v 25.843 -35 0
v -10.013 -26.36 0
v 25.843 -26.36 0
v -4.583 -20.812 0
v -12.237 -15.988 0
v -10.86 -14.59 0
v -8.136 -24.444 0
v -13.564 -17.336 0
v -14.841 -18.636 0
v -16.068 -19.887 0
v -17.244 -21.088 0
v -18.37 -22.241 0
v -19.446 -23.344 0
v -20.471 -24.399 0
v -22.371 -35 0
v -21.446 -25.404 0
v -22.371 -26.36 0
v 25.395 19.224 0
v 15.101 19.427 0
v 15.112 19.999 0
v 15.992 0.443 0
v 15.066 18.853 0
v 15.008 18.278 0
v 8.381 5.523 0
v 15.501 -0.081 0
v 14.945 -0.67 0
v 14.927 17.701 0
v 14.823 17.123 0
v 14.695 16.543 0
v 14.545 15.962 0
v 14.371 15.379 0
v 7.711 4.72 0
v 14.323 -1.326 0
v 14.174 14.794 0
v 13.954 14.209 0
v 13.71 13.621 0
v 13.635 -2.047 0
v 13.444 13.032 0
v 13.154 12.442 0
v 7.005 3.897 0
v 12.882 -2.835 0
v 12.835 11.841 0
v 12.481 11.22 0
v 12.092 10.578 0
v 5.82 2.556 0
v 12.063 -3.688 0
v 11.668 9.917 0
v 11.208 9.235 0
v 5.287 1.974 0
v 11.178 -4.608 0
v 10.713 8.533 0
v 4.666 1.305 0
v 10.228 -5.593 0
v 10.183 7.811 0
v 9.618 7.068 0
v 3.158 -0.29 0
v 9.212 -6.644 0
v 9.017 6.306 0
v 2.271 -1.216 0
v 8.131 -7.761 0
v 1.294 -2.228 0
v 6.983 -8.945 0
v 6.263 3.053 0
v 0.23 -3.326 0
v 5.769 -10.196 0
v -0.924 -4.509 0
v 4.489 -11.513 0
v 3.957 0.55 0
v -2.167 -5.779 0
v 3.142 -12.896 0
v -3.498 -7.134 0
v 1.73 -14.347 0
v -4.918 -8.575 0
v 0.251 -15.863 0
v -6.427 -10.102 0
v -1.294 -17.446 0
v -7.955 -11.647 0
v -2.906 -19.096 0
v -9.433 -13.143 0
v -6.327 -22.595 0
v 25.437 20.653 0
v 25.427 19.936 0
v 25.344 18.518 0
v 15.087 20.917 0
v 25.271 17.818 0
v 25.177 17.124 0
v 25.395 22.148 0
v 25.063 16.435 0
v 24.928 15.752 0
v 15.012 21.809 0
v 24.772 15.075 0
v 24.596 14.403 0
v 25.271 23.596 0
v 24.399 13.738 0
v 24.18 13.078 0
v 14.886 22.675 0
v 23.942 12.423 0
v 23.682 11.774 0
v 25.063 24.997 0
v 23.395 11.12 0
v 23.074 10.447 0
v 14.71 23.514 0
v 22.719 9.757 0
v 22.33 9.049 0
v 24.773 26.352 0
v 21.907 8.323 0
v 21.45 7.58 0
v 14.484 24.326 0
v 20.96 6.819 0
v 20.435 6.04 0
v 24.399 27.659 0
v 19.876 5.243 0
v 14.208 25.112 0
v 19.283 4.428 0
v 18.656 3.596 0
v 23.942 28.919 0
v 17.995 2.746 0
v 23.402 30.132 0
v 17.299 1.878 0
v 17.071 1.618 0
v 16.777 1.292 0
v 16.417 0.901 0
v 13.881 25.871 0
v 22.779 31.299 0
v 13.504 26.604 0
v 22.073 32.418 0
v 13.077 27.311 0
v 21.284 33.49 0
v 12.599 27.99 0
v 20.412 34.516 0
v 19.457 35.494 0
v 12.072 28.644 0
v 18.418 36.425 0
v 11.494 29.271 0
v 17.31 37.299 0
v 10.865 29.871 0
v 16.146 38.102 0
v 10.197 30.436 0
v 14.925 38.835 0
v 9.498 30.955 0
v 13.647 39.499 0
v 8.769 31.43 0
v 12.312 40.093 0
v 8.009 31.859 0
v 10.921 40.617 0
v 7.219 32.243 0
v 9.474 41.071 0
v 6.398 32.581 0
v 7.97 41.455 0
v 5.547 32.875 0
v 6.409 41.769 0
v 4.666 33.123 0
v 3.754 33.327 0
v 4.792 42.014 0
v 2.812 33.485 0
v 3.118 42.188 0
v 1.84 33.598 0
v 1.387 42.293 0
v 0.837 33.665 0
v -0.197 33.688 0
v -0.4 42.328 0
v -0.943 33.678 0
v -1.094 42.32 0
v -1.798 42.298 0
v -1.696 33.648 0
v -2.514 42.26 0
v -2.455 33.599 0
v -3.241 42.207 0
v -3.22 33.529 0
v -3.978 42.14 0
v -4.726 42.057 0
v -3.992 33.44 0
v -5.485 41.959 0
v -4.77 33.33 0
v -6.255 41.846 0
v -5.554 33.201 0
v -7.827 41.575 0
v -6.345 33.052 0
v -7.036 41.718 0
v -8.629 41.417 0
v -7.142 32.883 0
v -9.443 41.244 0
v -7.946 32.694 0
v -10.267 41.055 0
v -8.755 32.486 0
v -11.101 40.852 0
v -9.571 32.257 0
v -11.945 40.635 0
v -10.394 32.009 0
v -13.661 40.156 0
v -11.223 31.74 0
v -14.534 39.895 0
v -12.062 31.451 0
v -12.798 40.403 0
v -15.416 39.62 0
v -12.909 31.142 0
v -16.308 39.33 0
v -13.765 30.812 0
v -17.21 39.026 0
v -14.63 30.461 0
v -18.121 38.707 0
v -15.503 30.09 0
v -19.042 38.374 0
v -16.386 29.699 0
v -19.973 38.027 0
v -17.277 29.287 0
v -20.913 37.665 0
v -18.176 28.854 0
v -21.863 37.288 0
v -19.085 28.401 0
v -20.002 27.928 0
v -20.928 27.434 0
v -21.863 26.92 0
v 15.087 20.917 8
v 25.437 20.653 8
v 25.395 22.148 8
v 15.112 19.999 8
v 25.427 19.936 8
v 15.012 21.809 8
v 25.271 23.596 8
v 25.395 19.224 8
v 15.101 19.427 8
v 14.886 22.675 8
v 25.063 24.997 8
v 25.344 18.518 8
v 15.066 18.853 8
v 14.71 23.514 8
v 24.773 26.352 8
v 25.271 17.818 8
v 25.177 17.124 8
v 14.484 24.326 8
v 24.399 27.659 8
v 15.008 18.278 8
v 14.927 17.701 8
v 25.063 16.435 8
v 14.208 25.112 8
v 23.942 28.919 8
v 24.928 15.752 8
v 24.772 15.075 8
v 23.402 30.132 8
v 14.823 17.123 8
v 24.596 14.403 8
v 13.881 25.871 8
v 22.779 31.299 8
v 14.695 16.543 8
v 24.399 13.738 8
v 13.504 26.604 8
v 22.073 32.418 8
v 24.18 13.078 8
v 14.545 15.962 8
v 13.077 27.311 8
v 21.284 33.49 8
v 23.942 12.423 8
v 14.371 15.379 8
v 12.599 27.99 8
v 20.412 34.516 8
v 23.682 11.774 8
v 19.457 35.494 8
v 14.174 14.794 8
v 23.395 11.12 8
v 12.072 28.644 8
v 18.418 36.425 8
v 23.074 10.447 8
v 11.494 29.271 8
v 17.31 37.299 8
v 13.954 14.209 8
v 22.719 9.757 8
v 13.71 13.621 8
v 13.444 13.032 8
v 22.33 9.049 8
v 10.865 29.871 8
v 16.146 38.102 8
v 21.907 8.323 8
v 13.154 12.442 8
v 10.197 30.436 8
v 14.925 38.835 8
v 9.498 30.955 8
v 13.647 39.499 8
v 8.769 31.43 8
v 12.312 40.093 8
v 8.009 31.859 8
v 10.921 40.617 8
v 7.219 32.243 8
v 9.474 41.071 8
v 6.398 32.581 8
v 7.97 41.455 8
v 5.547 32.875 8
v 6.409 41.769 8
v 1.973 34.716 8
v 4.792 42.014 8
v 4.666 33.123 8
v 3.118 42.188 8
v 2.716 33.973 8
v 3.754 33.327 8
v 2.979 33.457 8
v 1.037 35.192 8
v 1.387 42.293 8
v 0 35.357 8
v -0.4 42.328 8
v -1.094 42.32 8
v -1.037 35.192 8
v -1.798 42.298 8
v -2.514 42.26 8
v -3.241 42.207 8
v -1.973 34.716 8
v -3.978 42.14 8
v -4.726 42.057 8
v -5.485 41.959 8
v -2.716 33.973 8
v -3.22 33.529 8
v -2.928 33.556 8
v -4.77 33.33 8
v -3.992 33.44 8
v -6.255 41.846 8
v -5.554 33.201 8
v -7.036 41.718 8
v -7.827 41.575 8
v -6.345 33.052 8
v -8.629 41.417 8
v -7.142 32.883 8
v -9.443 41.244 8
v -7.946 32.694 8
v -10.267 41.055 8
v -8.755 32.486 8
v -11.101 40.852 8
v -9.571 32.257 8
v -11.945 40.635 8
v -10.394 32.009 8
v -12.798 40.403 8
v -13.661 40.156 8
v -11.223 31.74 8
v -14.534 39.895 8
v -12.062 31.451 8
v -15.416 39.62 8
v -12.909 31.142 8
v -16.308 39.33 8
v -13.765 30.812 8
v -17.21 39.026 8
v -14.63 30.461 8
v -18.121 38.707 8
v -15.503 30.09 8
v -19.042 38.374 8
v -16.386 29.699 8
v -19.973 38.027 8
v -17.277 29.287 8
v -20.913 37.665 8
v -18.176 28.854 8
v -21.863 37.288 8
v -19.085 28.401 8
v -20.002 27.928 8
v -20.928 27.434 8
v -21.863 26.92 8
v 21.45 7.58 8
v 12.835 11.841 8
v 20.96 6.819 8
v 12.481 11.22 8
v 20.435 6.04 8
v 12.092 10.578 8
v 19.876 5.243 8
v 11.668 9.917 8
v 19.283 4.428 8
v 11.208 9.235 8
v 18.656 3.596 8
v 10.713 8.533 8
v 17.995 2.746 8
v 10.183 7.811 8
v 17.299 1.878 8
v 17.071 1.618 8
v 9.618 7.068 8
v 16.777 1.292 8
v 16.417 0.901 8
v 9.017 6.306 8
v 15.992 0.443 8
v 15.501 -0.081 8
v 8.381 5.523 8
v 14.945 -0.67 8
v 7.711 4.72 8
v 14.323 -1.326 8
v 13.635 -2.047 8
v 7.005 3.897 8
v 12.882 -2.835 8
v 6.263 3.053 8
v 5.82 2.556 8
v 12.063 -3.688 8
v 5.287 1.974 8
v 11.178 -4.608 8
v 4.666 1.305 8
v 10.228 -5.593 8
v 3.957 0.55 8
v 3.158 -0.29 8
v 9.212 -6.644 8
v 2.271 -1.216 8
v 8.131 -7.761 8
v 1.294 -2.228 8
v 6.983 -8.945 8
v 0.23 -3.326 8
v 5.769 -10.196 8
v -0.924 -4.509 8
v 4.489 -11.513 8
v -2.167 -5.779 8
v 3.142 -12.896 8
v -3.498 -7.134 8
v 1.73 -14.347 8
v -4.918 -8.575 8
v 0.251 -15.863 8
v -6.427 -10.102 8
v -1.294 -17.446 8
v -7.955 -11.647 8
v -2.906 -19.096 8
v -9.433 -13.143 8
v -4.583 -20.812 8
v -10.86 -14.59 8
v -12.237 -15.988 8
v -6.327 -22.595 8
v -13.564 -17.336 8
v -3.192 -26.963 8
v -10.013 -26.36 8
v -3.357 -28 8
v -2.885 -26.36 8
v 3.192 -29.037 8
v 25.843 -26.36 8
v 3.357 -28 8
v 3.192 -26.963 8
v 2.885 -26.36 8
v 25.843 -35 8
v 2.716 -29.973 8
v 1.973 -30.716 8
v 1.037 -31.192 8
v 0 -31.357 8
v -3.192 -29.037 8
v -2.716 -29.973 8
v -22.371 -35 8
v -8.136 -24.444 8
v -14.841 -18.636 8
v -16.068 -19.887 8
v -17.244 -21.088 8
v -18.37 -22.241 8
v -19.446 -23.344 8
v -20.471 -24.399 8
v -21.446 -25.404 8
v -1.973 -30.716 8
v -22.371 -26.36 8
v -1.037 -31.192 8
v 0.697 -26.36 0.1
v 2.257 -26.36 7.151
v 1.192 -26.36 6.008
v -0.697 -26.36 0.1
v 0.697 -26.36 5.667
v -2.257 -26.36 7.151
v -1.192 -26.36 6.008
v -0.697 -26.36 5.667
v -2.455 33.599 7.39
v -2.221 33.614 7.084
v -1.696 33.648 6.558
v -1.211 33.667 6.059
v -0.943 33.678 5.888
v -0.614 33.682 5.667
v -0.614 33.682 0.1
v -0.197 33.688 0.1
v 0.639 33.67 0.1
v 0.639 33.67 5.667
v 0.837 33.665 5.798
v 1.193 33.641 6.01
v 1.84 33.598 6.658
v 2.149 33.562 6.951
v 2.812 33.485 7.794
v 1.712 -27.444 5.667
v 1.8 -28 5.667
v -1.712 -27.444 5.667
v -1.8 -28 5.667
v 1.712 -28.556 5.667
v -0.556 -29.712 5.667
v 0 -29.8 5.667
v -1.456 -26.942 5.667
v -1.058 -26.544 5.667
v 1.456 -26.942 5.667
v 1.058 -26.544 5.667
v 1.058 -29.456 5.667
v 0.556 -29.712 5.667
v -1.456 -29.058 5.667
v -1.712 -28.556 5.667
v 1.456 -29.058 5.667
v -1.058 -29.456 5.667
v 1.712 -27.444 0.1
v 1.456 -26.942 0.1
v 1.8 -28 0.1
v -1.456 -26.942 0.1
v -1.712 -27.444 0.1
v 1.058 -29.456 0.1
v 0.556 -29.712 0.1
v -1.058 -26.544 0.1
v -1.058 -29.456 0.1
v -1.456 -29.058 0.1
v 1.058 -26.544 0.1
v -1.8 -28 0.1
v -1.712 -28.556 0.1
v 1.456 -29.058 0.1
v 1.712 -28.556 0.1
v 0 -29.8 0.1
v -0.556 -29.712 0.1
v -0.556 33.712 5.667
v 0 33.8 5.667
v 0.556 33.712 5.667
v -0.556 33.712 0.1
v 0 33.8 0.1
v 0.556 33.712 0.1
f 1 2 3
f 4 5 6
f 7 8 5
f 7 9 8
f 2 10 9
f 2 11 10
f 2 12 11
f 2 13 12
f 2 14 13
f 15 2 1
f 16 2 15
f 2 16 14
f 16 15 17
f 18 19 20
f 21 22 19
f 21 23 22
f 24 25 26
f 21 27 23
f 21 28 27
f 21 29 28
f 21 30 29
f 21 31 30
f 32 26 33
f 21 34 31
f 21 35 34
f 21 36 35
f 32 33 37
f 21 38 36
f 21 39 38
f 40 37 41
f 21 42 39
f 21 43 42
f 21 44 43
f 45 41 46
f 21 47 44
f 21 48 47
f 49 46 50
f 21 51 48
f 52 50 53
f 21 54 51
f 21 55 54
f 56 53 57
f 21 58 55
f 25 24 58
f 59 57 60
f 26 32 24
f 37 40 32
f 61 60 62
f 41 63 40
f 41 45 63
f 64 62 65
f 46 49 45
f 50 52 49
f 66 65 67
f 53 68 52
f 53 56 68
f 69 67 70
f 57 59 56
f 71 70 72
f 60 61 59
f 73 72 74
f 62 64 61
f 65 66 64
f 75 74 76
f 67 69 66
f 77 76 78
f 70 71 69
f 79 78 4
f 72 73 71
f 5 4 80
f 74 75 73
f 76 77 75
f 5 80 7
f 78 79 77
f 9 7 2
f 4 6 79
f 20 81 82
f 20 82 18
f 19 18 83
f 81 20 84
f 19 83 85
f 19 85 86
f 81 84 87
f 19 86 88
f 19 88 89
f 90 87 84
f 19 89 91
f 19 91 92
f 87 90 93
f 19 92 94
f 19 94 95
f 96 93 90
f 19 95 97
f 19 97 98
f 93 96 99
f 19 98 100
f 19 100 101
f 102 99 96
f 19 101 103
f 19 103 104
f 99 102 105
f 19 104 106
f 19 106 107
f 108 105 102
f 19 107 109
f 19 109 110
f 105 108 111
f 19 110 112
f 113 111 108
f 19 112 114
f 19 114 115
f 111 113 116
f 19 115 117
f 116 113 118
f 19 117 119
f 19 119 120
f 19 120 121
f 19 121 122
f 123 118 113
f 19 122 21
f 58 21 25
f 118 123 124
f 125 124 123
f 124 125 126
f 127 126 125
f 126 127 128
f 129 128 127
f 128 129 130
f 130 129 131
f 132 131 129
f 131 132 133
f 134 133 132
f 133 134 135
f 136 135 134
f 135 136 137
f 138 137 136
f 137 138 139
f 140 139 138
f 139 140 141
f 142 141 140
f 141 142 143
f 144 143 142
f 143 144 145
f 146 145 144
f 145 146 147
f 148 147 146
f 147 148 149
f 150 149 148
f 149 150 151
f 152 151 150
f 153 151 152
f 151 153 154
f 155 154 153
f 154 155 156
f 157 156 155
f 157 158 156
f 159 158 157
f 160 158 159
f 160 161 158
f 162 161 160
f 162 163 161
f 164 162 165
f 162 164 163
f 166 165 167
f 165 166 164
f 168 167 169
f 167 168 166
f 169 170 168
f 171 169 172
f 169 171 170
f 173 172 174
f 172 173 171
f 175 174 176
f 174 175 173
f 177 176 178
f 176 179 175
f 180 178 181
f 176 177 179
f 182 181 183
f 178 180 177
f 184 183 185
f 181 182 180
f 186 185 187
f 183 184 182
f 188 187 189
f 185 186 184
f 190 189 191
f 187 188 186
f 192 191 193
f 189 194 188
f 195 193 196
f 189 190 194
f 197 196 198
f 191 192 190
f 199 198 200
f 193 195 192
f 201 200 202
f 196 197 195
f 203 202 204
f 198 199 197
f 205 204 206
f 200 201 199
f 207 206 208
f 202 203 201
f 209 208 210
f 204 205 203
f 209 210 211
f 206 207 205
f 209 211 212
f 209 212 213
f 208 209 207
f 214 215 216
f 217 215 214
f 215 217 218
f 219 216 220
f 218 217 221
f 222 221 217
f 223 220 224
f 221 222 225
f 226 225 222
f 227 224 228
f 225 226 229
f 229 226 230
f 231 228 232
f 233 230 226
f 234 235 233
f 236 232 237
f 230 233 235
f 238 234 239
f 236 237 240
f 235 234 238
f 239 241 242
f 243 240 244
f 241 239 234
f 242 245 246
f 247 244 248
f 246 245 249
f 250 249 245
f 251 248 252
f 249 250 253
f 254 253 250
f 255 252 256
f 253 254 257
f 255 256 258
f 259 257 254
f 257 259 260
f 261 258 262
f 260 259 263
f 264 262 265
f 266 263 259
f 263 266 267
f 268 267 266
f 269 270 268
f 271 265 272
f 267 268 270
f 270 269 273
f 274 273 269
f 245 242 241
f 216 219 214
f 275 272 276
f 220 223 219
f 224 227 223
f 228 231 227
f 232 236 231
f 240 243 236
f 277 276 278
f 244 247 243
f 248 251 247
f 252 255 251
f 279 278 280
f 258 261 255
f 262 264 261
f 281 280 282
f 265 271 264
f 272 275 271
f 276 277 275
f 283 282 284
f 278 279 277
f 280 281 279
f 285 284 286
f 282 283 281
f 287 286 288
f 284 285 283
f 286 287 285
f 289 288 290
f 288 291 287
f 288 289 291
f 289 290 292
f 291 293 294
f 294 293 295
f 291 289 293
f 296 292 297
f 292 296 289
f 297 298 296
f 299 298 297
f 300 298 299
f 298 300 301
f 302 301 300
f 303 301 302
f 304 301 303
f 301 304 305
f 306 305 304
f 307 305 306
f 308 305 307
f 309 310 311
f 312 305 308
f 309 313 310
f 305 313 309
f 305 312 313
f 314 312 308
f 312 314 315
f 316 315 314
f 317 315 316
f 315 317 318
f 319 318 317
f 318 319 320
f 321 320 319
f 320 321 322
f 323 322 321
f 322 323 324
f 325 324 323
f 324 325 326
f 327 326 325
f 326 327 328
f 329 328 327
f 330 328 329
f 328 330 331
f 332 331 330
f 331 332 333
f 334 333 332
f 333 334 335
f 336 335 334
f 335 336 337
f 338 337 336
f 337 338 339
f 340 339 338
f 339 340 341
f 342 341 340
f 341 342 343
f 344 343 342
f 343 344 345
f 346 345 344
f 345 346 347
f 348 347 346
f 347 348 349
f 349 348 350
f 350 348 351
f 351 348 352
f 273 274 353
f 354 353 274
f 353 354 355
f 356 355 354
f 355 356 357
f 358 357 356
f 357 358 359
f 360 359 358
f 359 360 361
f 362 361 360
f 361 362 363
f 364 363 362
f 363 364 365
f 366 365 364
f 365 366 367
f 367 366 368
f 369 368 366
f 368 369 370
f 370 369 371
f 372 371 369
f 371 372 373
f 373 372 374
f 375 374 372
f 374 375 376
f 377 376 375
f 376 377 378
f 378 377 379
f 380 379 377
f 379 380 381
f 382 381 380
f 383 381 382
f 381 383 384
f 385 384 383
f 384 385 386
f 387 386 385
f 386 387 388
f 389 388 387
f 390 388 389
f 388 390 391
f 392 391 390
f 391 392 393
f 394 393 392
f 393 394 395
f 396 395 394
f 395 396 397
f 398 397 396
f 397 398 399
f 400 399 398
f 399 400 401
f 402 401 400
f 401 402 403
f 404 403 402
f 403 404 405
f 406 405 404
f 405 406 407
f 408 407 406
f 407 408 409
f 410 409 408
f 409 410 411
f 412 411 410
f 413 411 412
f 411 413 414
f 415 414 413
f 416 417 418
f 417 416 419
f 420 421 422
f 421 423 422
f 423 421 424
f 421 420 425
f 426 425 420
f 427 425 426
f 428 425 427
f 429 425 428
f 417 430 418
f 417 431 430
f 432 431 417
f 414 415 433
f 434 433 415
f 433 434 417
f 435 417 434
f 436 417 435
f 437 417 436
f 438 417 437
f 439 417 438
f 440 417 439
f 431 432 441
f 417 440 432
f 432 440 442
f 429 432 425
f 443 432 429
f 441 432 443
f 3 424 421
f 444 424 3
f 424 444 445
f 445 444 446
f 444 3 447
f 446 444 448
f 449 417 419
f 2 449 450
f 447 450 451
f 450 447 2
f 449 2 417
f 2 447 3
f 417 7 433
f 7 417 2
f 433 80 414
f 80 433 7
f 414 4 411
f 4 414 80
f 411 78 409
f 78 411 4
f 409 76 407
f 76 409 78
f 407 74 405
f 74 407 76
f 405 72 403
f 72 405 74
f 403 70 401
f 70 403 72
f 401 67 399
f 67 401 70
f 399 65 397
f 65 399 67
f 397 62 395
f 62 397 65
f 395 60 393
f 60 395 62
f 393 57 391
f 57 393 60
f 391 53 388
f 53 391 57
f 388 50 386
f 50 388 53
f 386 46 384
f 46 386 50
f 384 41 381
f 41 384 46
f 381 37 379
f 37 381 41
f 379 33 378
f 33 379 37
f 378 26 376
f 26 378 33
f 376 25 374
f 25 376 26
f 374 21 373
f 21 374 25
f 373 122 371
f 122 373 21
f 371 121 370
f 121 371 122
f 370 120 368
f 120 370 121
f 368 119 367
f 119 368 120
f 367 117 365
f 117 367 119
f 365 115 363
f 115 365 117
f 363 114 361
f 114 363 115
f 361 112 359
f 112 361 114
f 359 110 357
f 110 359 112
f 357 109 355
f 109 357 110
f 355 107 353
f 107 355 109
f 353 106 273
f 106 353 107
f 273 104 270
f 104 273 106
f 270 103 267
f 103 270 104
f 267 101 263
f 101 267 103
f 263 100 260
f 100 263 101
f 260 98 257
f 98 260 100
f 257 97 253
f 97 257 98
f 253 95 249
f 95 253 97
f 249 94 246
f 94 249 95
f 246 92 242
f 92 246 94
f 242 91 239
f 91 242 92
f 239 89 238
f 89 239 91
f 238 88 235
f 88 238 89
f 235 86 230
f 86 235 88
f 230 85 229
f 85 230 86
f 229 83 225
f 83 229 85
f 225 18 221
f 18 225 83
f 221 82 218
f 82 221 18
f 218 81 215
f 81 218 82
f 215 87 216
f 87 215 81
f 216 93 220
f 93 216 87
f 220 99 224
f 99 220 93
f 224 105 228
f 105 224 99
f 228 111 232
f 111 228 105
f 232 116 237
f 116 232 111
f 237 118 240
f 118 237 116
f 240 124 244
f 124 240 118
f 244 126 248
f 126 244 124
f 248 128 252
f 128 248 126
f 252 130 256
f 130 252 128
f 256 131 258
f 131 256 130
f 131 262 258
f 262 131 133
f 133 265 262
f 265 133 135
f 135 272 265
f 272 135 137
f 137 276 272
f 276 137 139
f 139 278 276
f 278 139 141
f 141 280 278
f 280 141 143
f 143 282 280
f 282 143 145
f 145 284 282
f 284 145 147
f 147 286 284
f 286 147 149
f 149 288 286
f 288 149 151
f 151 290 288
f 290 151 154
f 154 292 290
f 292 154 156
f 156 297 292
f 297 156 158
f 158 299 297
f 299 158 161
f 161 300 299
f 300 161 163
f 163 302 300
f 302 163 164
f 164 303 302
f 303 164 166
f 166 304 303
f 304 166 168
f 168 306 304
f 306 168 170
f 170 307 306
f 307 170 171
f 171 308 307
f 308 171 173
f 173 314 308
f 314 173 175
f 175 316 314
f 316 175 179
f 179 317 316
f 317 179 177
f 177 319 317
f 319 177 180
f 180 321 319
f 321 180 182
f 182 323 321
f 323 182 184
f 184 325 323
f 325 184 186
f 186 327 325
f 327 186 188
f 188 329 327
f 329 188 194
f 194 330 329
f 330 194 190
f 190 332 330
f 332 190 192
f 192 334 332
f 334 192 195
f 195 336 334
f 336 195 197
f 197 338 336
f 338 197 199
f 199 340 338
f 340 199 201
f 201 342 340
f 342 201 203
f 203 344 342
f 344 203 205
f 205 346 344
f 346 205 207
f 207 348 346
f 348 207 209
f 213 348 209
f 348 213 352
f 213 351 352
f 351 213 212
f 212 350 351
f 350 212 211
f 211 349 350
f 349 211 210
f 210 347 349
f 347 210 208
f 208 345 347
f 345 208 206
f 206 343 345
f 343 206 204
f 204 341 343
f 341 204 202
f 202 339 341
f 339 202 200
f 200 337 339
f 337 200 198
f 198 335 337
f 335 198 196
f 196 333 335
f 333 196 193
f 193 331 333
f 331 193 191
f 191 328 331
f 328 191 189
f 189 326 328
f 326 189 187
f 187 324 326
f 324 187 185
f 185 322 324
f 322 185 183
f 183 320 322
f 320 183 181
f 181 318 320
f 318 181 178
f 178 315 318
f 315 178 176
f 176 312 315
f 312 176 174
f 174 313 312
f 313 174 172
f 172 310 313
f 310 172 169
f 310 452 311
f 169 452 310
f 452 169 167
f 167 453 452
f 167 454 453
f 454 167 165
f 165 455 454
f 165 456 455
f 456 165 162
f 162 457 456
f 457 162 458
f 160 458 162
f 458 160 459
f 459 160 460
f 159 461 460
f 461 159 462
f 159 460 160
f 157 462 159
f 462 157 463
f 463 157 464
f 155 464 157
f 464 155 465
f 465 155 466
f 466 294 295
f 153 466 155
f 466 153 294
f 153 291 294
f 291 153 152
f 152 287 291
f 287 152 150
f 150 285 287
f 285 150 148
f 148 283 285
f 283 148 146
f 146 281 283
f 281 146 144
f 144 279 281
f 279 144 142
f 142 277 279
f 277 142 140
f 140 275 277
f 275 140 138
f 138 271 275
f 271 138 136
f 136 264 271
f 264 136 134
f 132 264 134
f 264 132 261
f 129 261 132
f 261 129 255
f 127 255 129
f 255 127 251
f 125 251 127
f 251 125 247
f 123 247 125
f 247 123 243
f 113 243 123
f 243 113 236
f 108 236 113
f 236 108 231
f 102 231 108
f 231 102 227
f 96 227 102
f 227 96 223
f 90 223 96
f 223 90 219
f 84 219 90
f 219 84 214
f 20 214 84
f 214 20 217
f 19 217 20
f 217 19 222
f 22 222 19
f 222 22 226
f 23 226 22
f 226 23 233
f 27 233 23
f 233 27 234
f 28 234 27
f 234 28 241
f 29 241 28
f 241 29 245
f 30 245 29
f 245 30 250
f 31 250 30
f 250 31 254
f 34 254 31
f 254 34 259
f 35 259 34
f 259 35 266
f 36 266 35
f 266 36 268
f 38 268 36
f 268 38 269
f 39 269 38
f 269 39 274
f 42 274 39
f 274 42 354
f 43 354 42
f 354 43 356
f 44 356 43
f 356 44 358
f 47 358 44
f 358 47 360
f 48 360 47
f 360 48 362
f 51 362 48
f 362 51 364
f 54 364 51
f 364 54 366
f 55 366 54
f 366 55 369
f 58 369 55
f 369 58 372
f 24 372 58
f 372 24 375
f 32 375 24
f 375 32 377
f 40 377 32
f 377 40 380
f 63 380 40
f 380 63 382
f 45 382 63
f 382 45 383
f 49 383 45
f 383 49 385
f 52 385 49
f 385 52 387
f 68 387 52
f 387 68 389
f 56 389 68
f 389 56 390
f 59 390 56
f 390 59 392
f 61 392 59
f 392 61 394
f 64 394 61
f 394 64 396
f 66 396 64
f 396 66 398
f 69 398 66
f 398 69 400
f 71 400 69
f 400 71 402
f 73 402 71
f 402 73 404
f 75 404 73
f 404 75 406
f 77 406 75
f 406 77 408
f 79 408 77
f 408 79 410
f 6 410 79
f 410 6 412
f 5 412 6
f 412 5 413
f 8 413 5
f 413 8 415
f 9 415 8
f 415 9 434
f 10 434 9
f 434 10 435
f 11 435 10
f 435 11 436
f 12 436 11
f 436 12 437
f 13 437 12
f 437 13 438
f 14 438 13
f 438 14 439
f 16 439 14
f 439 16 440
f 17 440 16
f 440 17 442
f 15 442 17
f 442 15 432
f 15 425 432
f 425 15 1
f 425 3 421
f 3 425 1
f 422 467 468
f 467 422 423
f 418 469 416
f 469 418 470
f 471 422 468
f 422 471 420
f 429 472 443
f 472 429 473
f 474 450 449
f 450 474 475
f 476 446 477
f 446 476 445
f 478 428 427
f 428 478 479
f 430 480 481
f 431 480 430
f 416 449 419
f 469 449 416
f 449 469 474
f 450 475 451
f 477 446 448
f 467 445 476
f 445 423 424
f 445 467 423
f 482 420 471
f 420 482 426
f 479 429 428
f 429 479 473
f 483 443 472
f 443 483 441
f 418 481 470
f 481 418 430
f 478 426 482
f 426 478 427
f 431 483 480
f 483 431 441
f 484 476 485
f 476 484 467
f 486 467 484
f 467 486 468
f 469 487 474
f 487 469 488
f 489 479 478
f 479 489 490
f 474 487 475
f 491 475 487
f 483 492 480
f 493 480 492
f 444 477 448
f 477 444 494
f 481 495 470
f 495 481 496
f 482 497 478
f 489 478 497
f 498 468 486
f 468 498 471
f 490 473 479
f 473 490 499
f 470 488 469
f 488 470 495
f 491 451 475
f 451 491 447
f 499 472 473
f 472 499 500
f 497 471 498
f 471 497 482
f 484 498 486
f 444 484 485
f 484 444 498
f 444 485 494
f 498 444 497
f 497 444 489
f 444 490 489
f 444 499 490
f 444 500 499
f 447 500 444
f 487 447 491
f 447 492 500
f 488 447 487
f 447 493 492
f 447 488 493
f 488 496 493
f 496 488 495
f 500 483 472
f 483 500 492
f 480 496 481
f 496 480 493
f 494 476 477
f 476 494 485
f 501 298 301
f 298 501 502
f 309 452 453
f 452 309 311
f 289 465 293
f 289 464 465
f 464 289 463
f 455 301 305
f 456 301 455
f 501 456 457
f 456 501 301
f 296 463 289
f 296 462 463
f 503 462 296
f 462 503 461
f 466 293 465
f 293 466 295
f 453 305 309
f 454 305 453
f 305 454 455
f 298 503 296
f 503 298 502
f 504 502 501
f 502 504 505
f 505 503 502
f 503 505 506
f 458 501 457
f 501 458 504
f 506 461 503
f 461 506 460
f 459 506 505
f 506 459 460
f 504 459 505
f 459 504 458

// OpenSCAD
// Street Numbers for 3D printing
// Charles Tilford, 2019
// License: CC BY-NC-SA 4.0
//   https://creativecommons.org/licenses/by-nc-sa/4.0/

char="2";     // The number/letter to print

// Units are in mm, except for height of letter

// How many inches high should letter be?
inchesHigh=3;
// How thick/deep should letter be (mm)?
depth=8;

// Character coordinates just center the letter
charX=-30;    // Character X coord
charY=-35;    // Character Y coord
topScrew=32;  // Top screw Y coord
botScrew=-28; // Bottom screw Y coord
height=8;     // Thickness of character
// Screw dimensions. Default presumes
// #6 sheet metal screw
screwWid=3.6; // Width of screw shaft
screwTop=6.78;// Width of screw head
screwCon=5.08;// Height of head 'cone'

// Font to print in. Your system needs this
// installed, of course. If changed the hole
// positions almost certainly need to be
// changed, and maybe charX/charY.
fName="Open Sans Extrabold";
// https://fonts.google.com/specimen/Open+Sans
// Designer: Steve Matteson

// Thin floor below holes. My printer was
// struggling to have the hole 'border' stick
// to the stage. Just drill/screw thru it.
holeFloor=0.1; 

// ==========================================
// ===== All values below are auto-calculated
// ==========================================

// Scaled values
scaleFactor=inchesHigh / 3;
cX=charX * scaleFactor;
cY=charY * scaleFactor;
tS=topScrew * scaleFactor;
bS=botScrew * scaleFactor;
// Where do we start drawing screw head cone?
oS=depth - (screwCon-.05);

difference() {
  // We use difference() to punch out the screw holes
  // in the character
    
  // The character itself, 8mm thick
  translate([cX,cY,0])
    linear_extrude(height=depth, scale=1)
    text(char, size=(75*scaleFactor),
         $fn=100, font=fName);
    
  // Bottom screw hole
  translate([0,bS,oS]) color("red")
    cylinder(h=screwCon, d2=screwTop,
             d1=0, $fn=20);
   translate([0,bS,holeFloor])
    cylinder(h=20, d=screwWid, $fn=20);
    
  // Top screw hole
  translate([0,tS,oS]) color("red")
    cylinder(h=screwCon, d2=screwTop,
             d1=0, $fn=20);
  translate([0,tS,holeFloor])
    cylinder(h=20, d=screwWid, $fn=20);
}

// Colors are just to aid visualization of
// void spaces. $fn is "featuer number", ie how
// many polygons are devoted to object. The values
// above should be near your printing limit anyway.

// Developed in OpenSCAD
//    https://www.openscad.org/
